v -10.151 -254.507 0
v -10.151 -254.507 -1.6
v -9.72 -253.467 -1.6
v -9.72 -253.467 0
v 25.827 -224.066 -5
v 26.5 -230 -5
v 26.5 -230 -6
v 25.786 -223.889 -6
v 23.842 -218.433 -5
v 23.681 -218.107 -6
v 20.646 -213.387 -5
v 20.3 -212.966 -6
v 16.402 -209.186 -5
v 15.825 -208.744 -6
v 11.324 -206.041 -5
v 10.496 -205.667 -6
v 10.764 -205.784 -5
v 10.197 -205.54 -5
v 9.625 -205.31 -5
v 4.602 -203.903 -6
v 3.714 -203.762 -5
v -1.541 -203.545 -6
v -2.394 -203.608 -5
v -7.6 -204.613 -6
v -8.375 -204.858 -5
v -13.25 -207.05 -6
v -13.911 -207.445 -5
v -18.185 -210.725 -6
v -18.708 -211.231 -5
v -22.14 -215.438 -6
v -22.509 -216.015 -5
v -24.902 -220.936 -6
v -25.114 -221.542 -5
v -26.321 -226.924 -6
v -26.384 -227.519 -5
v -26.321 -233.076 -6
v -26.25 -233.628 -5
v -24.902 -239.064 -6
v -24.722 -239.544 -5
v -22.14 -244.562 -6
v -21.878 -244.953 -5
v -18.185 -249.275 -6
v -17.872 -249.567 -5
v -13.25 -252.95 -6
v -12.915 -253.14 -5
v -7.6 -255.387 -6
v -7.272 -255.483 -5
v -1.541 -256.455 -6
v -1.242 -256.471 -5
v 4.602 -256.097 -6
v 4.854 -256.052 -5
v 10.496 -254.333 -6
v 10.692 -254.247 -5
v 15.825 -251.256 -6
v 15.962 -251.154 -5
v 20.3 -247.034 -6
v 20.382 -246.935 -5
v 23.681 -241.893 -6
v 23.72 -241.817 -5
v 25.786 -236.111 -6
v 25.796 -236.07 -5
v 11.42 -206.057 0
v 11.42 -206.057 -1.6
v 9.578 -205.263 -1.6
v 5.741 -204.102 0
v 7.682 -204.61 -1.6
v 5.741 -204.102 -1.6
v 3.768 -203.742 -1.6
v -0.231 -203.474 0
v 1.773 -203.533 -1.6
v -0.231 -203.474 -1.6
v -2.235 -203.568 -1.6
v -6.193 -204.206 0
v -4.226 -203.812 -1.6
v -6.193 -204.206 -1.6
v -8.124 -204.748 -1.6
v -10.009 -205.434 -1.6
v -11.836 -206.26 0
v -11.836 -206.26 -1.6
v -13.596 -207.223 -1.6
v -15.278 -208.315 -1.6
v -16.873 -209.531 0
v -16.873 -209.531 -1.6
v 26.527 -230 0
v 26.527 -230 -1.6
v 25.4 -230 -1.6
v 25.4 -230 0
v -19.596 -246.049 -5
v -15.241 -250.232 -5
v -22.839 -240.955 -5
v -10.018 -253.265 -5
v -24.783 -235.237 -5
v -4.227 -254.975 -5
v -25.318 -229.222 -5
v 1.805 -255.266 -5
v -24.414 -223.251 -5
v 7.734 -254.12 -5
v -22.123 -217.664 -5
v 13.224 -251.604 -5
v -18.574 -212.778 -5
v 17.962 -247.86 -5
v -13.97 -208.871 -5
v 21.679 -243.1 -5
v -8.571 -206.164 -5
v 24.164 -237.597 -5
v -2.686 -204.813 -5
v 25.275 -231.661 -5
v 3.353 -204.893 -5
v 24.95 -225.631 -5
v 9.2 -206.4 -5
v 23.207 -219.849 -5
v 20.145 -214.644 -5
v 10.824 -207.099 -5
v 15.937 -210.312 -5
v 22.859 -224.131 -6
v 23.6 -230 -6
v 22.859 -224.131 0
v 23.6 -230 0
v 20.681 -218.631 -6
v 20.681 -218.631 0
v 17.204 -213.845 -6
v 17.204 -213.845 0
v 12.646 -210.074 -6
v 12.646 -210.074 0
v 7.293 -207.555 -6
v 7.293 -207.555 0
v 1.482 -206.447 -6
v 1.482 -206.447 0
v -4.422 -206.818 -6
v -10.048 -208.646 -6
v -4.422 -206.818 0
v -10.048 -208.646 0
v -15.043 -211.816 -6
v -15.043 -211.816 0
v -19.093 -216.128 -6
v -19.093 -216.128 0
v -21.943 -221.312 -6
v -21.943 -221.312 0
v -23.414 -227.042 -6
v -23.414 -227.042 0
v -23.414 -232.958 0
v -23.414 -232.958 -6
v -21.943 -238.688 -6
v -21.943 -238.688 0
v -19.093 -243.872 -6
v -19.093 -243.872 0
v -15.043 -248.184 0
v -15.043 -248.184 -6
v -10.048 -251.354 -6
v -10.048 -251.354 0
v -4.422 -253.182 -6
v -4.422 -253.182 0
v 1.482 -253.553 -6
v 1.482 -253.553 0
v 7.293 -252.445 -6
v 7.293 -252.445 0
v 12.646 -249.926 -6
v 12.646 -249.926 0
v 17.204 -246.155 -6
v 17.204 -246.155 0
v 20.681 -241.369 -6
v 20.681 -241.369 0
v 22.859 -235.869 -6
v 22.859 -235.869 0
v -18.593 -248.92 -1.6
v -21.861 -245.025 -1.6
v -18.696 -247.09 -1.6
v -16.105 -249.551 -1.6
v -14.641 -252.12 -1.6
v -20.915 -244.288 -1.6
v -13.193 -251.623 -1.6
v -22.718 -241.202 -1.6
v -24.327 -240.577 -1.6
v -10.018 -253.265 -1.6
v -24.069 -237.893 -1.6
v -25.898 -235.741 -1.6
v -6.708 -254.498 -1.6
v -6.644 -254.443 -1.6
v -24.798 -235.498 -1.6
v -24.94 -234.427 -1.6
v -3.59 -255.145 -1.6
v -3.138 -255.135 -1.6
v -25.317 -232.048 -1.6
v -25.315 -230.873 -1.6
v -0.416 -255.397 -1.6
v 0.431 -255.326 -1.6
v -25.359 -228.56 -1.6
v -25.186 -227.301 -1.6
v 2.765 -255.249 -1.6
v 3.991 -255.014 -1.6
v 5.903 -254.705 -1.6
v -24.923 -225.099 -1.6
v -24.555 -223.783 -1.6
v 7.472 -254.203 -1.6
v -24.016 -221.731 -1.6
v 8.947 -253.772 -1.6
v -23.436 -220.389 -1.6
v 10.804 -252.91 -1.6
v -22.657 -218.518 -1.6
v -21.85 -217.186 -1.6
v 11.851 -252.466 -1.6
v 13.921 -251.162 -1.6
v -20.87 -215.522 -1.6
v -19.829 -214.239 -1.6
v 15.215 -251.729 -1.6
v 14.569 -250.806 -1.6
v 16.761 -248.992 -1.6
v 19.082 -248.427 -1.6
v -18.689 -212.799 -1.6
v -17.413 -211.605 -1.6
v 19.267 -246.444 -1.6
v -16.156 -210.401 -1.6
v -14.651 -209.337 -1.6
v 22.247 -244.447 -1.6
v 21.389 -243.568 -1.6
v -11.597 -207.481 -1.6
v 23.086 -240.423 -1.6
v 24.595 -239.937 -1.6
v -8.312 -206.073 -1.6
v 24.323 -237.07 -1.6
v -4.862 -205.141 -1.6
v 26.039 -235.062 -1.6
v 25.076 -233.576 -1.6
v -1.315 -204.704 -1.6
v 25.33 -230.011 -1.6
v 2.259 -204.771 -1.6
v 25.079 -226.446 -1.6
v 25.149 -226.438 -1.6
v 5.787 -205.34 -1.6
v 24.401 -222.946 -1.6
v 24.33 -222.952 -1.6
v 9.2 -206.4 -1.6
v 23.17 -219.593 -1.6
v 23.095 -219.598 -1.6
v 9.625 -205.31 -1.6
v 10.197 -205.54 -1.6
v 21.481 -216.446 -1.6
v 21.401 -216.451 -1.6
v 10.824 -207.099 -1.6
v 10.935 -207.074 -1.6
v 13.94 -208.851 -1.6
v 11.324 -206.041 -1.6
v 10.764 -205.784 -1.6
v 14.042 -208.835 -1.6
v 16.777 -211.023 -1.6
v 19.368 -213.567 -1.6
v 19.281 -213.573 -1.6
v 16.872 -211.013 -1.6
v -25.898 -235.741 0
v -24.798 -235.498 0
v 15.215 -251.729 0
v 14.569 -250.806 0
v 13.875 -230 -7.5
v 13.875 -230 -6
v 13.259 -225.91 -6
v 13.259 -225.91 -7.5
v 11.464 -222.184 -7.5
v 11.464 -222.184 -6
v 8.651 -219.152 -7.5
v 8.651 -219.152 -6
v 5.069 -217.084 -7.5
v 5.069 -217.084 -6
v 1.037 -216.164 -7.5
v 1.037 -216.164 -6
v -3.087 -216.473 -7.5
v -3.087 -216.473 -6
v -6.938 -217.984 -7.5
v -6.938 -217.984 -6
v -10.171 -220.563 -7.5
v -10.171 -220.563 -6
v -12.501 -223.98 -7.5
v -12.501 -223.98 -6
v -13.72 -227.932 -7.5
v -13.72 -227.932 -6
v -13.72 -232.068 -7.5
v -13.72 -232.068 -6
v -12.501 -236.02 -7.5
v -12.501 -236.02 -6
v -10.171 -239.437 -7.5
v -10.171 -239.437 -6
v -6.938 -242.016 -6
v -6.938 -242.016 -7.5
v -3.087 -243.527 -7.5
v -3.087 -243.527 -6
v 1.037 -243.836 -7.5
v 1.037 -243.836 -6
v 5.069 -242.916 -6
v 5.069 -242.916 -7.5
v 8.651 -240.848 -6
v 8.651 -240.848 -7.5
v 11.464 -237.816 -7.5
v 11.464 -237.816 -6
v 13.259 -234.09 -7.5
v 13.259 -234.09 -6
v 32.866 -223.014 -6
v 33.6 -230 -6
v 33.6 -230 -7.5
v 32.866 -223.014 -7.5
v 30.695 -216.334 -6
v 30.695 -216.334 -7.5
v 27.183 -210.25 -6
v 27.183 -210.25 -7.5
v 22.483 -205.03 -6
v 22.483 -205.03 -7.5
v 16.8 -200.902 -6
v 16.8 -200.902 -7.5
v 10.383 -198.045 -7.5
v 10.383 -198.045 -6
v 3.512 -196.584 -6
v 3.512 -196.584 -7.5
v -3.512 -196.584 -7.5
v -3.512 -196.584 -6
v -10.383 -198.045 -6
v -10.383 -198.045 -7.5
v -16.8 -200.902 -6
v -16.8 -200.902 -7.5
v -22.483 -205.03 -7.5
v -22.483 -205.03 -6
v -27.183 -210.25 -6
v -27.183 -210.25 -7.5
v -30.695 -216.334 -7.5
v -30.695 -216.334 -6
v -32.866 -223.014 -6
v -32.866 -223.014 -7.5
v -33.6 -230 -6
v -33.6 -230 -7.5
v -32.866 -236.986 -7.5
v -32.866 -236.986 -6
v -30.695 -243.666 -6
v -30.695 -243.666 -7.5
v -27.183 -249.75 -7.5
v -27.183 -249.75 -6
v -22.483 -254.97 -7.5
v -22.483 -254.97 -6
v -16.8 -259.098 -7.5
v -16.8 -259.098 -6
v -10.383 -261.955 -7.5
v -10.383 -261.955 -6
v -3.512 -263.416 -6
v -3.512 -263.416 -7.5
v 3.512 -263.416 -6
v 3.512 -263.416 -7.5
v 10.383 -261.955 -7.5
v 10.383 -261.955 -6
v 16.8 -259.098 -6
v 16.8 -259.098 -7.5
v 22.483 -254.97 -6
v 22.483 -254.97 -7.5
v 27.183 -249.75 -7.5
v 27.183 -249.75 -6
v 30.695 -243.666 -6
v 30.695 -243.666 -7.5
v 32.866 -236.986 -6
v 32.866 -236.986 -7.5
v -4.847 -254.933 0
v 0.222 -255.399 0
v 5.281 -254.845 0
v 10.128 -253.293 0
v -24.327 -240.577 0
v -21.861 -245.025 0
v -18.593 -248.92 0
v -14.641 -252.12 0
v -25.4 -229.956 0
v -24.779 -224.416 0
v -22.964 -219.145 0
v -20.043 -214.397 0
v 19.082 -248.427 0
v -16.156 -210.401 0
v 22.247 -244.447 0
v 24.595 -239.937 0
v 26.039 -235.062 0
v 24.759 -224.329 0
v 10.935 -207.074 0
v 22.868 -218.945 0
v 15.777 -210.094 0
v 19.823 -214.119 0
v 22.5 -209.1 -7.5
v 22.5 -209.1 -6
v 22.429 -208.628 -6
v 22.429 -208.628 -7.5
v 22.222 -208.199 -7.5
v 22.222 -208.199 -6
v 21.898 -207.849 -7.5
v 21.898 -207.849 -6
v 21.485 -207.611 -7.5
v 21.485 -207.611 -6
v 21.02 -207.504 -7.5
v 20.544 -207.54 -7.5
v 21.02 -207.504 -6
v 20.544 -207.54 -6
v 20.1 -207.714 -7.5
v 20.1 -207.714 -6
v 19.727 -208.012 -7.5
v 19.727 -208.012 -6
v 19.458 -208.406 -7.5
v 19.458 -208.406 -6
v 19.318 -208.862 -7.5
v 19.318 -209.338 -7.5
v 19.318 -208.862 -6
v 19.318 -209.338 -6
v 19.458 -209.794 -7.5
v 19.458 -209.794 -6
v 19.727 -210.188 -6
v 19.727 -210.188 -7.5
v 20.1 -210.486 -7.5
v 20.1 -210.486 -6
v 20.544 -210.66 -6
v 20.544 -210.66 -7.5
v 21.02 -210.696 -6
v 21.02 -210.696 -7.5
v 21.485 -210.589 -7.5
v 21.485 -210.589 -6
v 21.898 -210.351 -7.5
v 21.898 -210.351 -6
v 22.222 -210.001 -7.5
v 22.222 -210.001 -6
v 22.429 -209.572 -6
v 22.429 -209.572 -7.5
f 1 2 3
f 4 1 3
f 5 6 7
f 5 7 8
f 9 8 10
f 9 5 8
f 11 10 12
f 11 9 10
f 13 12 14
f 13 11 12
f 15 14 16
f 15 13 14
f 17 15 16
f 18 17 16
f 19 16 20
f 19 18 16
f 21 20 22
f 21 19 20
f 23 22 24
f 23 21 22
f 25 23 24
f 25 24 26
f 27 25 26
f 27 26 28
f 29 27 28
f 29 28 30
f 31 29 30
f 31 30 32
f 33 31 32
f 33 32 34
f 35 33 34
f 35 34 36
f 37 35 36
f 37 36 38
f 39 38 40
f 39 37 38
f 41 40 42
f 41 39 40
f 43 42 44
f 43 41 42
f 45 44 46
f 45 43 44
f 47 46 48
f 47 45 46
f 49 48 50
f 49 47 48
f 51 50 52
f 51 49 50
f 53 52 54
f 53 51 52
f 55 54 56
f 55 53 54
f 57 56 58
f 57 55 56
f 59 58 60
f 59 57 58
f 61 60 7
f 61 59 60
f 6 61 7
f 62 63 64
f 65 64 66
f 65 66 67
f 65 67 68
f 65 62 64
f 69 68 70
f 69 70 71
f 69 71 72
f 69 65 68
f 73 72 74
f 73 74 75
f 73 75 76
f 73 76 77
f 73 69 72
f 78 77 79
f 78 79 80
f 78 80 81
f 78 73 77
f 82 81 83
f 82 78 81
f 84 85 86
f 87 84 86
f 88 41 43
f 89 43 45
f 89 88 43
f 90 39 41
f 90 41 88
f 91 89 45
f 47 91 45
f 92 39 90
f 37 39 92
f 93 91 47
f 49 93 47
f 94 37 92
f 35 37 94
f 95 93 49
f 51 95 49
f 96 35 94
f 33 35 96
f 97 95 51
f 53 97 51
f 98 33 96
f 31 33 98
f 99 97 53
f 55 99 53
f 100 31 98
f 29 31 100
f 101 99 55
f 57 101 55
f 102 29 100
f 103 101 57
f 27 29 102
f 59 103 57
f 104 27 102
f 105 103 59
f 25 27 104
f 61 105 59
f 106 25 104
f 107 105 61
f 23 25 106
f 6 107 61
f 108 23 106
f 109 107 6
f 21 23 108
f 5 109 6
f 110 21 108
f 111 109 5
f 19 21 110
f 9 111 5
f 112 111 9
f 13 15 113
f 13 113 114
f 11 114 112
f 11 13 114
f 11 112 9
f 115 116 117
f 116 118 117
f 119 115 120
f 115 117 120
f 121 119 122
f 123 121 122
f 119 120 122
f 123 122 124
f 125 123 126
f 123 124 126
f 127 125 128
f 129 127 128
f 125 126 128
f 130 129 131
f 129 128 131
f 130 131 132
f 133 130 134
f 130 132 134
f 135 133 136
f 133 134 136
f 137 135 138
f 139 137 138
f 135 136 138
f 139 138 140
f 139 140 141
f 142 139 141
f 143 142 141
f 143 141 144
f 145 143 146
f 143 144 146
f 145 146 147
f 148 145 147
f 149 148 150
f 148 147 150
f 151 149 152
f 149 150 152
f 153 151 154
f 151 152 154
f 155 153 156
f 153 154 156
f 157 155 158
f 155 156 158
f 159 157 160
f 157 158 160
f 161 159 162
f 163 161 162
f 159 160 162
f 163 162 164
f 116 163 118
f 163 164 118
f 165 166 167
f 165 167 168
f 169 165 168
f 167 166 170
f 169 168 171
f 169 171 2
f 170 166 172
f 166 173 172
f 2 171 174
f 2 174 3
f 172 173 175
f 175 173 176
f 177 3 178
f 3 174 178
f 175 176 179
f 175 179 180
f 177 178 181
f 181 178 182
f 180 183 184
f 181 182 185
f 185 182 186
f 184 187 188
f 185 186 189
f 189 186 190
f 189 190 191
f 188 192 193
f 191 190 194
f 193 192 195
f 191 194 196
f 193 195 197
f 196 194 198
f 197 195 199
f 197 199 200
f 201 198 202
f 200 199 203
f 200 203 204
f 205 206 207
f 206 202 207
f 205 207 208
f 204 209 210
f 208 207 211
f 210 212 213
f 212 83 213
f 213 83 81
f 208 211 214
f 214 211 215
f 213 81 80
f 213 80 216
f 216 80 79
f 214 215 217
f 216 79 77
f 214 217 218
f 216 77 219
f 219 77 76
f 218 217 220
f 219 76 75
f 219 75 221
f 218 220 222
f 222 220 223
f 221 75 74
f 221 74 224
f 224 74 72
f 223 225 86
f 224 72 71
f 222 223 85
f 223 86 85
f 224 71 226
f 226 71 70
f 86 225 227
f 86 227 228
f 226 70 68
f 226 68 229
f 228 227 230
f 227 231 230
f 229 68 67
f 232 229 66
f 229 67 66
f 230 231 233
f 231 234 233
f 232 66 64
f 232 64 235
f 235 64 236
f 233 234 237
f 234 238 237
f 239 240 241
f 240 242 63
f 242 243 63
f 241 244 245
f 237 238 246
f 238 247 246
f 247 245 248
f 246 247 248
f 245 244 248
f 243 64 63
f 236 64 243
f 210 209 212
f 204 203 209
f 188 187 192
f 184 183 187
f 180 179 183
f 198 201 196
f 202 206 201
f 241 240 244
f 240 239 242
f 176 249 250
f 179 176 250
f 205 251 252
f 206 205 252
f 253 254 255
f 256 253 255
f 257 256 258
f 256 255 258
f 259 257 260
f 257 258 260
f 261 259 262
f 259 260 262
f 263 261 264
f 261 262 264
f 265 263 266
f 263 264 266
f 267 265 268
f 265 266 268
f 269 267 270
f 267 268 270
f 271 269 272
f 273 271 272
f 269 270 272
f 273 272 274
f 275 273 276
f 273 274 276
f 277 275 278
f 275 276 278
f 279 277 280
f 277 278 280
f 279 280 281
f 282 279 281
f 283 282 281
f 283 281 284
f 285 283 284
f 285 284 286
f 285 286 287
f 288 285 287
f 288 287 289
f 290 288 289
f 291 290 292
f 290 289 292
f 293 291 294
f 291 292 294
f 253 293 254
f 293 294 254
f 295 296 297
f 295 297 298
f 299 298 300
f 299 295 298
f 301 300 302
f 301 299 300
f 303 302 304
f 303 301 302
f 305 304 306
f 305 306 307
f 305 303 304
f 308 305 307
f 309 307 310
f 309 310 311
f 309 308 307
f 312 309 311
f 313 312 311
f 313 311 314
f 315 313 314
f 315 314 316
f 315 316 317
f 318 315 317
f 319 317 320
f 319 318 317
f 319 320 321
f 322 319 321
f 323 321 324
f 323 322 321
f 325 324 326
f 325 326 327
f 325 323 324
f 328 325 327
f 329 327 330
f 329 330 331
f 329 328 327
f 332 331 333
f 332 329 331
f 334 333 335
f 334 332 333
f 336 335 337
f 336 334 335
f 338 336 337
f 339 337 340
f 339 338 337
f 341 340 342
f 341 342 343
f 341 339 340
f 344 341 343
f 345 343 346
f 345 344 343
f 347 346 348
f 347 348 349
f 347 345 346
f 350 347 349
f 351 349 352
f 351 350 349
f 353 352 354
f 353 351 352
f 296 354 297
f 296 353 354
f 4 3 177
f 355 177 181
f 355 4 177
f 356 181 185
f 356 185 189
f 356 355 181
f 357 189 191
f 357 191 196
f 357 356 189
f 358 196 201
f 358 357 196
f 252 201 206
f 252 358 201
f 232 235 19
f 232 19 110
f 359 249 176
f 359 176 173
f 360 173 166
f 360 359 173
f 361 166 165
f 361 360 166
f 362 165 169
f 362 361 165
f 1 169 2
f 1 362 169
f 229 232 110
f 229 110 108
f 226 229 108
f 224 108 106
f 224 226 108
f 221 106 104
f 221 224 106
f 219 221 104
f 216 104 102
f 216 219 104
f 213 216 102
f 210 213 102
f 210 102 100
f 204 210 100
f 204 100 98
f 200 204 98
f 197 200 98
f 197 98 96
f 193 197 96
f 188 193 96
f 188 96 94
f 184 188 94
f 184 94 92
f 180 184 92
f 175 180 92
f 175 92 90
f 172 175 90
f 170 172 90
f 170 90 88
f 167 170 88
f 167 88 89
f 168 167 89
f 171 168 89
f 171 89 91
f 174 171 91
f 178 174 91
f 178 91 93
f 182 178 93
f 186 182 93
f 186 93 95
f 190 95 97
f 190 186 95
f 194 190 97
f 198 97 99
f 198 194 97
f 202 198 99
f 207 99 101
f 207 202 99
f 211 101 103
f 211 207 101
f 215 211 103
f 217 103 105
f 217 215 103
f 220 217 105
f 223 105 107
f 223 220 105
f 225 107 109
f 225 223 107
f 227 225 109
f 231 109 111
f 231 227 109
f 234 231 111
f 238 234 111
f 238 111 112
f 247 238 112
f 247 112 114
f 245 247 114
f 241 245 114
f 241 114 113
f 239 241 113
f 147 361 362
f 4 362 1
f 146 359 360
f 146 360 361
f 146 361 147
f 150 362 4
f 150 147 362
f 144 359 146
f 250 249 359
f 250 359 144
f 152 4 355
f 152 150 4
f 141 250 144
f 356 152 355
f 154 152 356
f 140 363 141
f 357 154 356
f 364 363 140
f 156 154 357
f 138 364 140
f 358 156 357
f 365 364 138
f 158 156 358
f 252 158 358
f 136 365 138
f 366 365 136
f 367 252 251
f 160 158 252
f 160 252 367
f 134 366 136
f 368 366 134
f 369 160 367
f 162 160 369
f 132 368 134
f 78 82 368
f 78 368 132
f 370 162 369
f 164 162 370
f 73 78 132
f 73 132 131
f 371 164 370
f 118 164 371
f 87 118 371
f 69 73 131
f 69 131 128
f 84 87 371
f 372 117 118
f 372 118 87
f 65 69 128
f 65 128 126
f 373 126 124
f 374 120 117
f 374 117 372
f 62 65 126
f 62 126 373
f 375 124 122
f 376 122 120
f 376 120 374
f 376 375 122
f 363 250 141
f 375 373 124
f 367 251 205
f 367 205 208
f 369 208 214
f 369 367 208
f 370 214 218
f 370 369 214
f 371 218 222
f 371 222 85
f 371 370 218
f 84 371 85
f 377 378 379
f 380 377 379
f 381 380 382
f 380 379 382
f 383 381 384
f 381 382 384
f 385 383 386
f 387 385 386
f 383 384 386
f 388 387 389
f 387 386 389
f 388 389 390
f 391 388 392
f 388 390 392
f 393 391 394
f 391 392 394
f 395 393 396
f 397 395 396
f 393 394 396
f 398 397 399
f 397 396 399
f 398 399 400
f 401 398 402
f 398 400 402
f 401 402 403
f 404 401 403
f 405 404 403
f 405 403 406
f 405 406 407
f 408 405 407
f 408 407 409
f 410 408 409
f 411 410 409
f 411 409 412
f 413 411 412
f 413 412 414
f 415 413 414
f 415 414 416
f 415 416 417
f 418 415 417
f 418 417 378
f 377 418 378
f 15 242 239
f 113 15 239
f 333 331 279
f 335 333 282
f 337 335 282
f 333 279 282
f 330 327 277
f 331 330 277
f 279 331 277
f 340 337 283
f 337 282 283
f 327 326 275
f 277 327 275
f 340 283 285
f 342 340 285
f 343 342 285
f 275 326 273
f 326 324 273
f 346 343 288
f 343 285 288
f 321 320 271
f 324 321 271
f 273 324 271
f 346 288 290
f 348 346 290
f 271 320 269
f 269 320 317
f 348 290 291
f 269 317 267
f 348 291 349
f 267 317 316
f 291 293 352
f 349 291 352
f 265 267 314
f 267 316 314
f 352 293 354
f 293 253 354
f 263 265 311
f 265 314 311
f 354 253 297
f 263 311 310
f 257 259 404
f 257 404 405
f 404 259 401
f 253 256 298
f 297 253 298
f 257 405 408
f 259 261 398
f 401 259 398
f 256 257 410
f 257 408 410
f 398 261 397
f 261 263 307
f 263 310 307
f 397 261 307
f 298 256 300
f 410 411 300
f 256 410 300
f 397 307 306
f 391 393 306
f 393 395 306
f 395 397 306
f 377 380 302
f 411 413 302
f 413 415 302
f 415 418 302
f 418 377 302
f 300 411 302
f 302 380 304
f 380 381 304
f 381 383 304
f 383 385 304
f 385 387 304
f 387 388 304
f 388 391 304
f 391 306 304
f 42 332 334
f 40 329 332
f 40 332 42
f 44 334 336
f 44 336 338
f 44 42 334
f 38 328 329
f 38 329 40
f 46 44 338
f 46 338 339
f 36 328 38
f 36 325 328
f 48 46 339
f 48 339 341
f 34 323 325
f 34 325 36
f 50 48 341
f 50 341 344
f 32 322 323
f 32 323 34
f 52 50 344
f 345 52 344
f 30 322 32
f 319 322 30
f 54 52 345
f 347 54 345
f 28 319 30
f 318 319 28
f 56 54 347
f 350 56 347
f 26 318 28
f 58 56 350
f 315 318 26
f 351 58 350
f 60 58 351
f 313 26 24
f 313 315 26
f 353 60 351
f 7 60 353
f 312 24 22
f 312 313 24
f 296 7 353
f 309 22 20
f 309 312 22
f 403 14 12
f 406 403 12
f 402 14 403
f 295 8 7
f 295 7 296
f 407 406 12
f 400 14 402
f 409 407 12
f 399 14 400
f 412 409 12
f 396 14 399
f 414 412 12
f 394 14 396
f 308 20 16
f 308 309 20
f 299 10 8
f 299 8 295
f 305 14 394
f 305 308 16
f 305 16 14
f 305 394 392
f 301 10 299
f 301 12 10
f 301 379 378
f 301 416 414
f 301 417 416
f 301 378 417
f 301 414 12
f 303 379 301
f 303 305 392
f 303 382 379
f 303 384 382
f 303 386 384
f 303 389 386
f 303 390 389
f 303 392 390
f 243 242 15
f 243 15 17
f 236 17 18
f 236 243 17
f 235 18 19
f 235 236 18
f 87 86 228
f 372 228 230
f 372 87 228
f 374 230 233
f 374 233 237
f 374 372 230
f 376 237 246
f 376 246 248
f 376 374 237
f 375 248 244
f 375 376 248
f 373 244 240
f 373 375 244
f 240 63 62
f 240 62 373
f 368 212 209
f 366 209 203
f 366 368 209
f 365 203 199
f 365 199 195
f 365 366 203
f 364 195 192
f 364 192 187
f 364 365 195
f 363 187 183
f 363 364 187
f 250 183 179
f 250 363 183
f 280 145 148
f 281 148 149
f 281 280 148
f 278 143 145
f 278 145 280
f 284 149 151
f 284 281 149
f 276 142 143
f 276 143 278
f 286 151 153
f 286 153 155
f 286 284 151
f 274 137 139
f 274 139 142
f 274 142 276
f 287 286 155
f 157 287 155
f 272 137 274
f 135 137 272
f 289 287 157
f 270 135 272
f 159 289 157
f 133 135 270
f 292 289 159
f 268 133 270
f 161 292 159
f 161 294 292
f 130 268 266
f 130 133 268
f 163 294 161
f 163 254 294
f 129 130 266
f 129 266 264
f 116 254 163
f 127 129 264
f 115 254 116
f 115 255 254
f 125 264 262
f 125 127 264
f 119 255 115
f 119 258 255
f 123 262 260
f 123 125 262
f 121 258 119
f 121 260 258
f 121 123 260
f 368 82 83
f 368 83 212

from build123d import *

# Parameters (mm, degrees)
SKETCH048_R          = 23.6
PAD003_DEPTH         = 1.6
SKETCH049_R          = 23.6
PAD004_DEPTH         = 5
SKETCH050_R          = 26.5
SKETCH050_R_2        = 23.6
PAD005_DEPTH         = 1
SKETCH051_R          = 33.6
SKETCH051_R_2        = 13.875
PAD006_DEPTH         = 1.5
SKETCH052_R          = 1.6
POCKET001_DEPTH      = 7.501
POCKET001_DEPTH_BACK = 0.001


with BuildPart() as part:
    # Sketch048 → Pad003 (new body)
    with BuildSketch(Plane.XY):
        with BuildLine():
            ThreePointArc((11.420042, 23.942616), (-3.232792, 26.328981), (-16.873061, 20.46866))
            Line((-16.873061, 20.46866), (-16.156387, 19.599264))
            ThreePointArc((-16.156387, 19.599264), (-24.016172, 8.269431), (-24.797919, -5.497566))
            Line((-25.897919, -5.74143), (-24.797919, -5.497566))
            ThreePointArc((-25.897919, -5.74143), (-20.320637, -17.051039), (-10.151331, -24.507482))
            Line((-10.151331, -24.507482), (-9.720159, -23.46654))
            ThreePointArc((-9.720159, -23.46654), (2.765219, -25.249031), (14.568841, -20.806462))
            Line((15.215094, -21.729407), (14.568841, -20.806462))
            ThreePointArc((15.215094, -21.729407), (23.529477, -12.24867), (26.526707, 0))
            Line((26.526707, 0), (25.4, 0))
            ThreePointArc((25.4, 0), (21.481487, 13.553809), (10.934982, 22.925666))
            Line((11.420042, 23.942616), (10.934982, 22.925666))
        make_face()
        Circle(SKETCH048_R, mode=Mode.SUBTRACT)
    extrude(amount=-PAD003_DEPTH)

    # Sketch049 → Pad004 (join)
    with BuildSketch(Plane.XY):
        with BuildLine():
            ThreePointArc((11.324142, 23.958585), (10.481101, 24.339197), (9.62529, 24.690156))
            Line((9.62529, 24.690156), (9.2003, 23.6))
            ThreePointArc((9.2003, 23.6), (-10.018324, -23.264538), (10.824142, 22.900731))
            Line((11.324142, 23.958585), (10.824142, 22.900731))
        make_face()
        Circle(SKETCH049_R, mode=Mode.SUBTRACT)
    extrude(amount=-PAD004_DEPTH)

    # Sketch050 (on DatumPlane) → Pad005 (join)
    with BuildSketch(Plane.XY.offset(-5)):
        Circle(SKETCH050_R)
        Circle(SKETCH050_R_2, mode=Mode.SUBTRACT)
    extrude(amount=-PAD005_DEPTH)

    # Sketch051 (on DatumPlane) → Pad006 (join)
    with BuildSketch(Plane.XY.offset(-6)):
        Circle(SKETCH051_R)
        Circle(SKETCH051_R_2, mode=Mode.SUBTRACT)
    extrude(amount=-PAD006_DEPTH)

    # Sketch052 → Pocket001 (cut, two sides)
    with BuildSketch(Plane.XY) as pocket001_sk:
        with Locations((20.9, 20.9)):
            Circle(SKETCH052_R)
    extrude(amount=-POCKET001_DEPTH, mode=Mode.SUBTRACT)
    extrude(pocket001_sk.sketch, amount=POCKET001_DEPTH_BACK, mode=Mode.SUBTRACT)


with BuildPart() as part_1:
    # Body010 placement: moved
    add(part.part.moved(Location((0, -230, 0))))


solid = part_1.part
